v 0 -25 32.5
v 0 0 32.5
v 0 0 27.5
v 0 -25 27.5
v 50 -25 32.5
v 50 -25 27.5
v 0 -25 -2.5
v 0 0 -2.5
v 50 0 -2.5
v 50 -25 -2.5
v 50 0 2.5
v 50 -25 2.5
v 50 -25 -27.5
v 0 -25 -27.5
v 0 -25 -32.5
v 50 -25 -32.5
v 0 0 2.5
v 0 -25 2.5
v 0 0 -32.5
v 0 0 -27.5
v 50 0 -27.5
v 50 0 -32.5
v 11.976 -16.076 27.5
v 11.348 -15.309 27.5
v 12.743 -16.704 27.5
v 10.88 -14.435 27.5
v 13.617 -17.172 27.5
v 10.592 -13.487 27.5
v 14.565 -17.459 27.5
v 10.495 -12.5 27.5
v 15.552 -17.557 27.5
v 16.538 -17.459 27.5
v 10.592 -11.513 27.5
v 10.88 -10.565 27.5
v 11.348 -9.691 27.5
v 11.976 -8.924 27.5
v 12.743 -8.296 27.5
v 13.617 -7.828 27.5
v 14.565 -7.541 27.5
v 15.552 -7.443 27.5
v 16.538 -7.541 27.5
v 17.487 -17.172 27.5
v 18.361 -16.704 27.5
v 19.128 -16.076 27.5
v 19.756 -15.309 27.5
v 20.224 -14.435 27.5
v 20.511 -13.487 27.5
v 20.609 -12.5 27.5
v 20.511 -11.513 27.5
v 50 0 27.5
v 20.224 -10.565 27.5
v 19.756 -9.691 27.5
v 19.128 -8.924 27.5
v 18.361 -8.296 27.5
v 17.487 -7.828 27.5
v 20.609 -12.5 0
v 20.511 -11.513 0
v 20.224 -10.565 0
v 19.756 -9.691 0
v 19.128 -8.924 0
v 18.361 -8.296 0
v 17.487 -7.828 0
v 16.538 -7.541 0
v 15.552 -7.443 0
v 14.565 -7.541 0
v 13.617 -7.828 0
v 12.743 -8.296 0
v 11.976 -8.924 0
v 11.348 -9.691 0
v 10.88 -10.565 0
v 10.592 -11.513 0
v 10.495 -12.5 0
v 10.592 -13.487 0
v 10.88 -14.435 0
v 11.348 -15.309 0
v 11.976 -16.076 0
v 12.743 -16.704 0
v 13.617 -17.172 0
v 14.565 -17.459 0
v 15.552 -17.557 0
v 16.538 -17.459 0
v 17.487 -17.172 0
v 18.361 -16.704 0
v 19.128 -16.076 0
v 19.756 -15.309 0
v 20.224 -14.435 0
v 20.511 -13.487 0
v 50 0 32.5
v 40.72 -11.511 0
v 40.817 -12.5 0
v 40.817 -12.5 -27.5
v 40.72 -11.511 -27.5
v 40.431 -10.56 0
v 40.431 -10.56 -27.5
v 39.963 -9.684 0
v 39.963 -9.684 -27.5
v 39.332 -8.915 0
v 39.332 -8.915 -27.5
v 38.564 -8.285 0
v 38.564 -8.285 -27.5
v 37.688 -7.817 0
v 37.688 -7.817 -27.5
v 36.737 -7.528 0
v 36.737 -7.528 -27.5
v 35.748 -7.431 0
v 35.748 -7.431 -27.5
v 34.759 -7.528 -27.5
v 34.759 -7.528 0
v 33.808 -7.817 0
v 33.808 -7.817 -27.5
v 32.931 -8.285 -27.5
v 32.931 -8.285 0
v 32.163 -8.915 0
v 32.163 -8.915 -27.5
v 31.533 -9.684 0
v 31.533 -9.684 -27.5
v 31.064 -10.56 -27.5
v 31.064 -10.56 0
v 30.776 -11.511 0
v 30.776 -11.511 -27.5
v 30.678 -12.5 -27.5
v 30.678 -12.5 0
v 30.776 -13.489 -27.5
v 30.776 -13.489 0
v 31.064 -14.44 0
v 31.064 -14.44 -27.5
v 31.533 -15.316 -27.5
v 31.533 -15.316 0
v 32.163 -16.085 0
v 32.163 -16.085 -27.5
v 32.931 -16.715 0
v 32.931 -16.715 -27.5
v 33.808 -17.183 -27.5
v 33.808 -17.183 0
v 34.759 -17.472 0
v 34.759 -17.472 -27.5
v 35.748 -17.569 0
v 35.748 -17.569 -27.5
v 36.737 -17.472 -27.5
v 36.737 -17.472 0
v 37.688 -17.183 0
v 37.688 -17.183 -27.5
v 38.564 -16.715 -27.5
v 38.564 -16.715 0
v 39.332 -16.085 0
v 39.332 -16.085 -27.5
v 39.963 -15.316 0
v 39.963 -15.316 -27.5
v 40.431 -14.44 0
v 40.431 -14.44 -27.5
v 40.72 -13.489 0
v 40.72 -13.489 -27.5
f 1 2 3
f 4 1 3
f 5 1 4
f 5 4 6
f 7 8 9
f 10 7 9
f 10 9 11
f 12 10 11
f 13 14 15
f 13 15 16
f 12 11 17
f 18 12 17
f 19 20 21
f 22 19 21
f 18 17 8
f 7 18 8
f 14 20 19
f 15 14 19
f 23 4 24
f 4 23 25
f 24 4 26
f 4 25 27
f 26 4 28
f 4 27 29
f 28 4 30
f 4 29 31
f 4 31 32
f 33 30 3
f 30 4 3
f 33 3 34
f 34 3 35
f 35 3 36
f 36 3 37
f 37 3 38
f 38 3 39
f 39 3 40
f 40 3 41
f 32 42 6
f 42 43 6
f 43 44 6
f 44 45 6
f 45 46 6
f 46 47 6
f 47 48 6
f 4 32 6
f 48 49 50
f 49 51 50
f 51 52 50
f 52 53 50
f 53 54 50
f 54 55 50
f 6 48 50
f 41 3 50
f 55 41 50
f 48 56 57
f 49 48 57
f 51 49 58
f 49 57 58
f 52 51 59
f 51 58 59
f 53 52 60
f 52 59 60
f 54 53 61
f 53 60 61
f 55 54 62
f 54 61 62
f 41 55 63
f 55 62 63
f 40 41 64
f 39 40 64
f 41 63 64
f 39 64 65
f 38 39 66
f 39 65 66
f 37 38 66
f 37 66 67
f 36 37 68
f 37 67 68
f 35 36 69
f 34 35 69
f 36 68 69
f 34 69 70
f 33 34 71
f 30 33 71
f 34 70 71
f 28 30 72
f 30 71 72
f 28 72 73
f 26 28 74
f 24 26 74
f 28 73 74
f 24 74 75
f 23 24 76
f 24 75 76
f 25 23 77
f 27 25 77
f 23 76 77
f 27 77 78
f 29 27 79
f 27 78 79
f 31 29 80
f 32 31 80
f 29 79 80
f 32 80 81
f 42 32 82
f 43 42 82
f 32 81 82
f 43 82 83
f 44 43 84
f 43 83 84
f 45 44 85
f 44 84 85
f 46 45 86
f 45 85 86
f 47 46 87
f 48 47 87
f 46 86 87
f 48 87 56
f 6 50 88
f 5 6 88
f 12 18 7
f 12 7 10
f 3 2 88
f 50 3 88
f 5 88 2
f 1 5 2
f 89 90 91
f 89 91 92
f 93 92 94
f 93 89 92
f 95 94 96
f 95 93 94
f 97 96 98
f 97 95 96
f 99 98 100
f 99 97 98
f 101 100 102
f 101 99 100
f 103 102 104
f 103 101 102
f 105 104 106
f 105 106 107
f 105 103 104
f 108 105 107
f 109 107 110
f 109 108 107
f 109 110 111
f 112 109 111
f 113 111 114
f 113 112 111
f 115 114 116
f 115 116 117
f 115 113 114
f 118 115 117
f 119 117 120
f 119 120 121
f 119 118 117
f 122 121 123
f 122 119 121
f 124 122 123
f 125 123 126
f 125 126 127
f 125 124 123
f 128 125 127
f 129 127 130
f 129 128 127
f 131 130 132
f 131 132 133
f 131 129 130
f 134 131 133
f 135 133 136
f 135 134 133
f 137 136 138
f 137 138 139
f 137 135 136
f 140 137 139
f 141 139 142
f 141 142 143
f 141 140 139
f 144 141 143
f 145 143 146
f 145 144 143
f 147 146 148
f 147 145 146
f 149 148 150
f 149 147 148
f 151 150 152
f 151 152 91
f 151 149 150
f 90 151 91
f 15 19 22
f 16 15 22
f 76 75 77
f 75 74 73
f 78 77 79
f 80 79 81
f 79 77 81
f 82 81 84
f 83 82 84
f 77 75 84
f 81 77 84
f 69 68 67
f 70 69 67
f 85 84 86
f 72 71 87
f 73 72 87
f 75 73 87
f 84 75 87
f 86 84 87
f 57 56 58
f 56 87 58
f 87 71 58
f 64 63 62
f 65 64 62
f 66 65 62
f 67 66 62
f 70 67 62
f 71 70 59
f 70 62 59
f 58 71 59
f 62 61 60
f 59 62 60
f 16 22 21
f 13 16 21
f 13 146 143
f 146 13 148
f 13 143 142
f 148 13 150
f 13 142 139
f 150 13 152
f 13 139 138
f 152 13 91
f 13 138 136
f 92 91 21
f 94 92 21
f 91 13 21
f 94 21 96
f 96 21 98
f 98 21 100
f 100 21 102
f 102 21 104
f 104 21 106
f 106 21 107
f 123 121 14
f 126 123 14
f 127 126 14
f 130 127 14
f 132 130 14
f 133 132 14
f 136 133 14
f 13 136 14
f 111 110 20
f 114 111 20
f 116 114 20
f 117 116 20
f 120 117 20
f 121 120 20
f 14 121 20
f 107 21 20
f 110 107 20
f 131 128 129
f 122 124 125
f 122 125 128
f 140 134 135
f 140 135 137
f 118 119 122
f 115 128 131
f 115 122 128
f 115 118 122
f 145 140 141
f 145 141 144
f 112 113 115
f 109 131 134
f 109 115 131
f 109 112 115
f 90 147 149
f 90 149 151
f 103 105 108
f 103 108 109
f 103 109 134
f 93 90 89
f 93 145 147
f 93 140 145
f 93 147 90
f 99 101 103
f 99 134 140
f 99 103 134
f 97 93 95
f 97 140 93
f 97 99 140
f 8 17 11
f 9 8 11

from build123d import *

# Parameters (mm, degrees)
F1_DEPTH = 25
F2_DEPTH = 25
F3_DEPTH = 25
F4_R     = 5.0692688019
F5_DEPTH = 27.5
F4_R_2   = 5.0566520552
F6_DEPTH = 27.5


with BuildPart() as f1:
    # F0 (on Front) → F1 (new body)
    with BuildSketch(Plane.XZ):
        Polygon((0, -27.5), (0, -32.5), (50, -32.5), (50, -27.5), (5, -27.5), align=None)
    extrude(amount=F1_DEPTH)

    # F4 (on Top) → F5 (join, through all)
    with BuildSketch(Plane.XY):
        with Locations((35.7477681773, -12.5000000002)):
            Circle(F4_R)
    extrude(amount=-F5_DEPTH)


with BuildPart() as f2:
    # F0 (on Front) → F2 (new body, through all)
    with BuildSketch(Plane.XZ):
        Polygon((0, 2.5), (0, -2.5), (5, -2.5), (50, -2.5), (50, 2.5), (5, 2.5), align=None)
    extrude(amount=F2_DEPTH)


with BuildPart() as f3:
    # F0 (on Front) → F3 (new body, through all)
    with BuildSketch(Plane.XZ):
        Polygon((0, 32.5), (0, 27.5), (5, 27.5), (50, 27.5), (50, 32.5), align=None)
    extrude(amount=F3_DEPTH)

    # F4 (on Top) → F6 (join, through all)
    with BuildSketch(Plane.XY):
        with Locations((15.5519776108, -12.5000000002)):
            Circle(F4_R_2)
    extrude(amount=F6_DEPTH)


solid = Compound([f1.part, f2.part, f3.part])
